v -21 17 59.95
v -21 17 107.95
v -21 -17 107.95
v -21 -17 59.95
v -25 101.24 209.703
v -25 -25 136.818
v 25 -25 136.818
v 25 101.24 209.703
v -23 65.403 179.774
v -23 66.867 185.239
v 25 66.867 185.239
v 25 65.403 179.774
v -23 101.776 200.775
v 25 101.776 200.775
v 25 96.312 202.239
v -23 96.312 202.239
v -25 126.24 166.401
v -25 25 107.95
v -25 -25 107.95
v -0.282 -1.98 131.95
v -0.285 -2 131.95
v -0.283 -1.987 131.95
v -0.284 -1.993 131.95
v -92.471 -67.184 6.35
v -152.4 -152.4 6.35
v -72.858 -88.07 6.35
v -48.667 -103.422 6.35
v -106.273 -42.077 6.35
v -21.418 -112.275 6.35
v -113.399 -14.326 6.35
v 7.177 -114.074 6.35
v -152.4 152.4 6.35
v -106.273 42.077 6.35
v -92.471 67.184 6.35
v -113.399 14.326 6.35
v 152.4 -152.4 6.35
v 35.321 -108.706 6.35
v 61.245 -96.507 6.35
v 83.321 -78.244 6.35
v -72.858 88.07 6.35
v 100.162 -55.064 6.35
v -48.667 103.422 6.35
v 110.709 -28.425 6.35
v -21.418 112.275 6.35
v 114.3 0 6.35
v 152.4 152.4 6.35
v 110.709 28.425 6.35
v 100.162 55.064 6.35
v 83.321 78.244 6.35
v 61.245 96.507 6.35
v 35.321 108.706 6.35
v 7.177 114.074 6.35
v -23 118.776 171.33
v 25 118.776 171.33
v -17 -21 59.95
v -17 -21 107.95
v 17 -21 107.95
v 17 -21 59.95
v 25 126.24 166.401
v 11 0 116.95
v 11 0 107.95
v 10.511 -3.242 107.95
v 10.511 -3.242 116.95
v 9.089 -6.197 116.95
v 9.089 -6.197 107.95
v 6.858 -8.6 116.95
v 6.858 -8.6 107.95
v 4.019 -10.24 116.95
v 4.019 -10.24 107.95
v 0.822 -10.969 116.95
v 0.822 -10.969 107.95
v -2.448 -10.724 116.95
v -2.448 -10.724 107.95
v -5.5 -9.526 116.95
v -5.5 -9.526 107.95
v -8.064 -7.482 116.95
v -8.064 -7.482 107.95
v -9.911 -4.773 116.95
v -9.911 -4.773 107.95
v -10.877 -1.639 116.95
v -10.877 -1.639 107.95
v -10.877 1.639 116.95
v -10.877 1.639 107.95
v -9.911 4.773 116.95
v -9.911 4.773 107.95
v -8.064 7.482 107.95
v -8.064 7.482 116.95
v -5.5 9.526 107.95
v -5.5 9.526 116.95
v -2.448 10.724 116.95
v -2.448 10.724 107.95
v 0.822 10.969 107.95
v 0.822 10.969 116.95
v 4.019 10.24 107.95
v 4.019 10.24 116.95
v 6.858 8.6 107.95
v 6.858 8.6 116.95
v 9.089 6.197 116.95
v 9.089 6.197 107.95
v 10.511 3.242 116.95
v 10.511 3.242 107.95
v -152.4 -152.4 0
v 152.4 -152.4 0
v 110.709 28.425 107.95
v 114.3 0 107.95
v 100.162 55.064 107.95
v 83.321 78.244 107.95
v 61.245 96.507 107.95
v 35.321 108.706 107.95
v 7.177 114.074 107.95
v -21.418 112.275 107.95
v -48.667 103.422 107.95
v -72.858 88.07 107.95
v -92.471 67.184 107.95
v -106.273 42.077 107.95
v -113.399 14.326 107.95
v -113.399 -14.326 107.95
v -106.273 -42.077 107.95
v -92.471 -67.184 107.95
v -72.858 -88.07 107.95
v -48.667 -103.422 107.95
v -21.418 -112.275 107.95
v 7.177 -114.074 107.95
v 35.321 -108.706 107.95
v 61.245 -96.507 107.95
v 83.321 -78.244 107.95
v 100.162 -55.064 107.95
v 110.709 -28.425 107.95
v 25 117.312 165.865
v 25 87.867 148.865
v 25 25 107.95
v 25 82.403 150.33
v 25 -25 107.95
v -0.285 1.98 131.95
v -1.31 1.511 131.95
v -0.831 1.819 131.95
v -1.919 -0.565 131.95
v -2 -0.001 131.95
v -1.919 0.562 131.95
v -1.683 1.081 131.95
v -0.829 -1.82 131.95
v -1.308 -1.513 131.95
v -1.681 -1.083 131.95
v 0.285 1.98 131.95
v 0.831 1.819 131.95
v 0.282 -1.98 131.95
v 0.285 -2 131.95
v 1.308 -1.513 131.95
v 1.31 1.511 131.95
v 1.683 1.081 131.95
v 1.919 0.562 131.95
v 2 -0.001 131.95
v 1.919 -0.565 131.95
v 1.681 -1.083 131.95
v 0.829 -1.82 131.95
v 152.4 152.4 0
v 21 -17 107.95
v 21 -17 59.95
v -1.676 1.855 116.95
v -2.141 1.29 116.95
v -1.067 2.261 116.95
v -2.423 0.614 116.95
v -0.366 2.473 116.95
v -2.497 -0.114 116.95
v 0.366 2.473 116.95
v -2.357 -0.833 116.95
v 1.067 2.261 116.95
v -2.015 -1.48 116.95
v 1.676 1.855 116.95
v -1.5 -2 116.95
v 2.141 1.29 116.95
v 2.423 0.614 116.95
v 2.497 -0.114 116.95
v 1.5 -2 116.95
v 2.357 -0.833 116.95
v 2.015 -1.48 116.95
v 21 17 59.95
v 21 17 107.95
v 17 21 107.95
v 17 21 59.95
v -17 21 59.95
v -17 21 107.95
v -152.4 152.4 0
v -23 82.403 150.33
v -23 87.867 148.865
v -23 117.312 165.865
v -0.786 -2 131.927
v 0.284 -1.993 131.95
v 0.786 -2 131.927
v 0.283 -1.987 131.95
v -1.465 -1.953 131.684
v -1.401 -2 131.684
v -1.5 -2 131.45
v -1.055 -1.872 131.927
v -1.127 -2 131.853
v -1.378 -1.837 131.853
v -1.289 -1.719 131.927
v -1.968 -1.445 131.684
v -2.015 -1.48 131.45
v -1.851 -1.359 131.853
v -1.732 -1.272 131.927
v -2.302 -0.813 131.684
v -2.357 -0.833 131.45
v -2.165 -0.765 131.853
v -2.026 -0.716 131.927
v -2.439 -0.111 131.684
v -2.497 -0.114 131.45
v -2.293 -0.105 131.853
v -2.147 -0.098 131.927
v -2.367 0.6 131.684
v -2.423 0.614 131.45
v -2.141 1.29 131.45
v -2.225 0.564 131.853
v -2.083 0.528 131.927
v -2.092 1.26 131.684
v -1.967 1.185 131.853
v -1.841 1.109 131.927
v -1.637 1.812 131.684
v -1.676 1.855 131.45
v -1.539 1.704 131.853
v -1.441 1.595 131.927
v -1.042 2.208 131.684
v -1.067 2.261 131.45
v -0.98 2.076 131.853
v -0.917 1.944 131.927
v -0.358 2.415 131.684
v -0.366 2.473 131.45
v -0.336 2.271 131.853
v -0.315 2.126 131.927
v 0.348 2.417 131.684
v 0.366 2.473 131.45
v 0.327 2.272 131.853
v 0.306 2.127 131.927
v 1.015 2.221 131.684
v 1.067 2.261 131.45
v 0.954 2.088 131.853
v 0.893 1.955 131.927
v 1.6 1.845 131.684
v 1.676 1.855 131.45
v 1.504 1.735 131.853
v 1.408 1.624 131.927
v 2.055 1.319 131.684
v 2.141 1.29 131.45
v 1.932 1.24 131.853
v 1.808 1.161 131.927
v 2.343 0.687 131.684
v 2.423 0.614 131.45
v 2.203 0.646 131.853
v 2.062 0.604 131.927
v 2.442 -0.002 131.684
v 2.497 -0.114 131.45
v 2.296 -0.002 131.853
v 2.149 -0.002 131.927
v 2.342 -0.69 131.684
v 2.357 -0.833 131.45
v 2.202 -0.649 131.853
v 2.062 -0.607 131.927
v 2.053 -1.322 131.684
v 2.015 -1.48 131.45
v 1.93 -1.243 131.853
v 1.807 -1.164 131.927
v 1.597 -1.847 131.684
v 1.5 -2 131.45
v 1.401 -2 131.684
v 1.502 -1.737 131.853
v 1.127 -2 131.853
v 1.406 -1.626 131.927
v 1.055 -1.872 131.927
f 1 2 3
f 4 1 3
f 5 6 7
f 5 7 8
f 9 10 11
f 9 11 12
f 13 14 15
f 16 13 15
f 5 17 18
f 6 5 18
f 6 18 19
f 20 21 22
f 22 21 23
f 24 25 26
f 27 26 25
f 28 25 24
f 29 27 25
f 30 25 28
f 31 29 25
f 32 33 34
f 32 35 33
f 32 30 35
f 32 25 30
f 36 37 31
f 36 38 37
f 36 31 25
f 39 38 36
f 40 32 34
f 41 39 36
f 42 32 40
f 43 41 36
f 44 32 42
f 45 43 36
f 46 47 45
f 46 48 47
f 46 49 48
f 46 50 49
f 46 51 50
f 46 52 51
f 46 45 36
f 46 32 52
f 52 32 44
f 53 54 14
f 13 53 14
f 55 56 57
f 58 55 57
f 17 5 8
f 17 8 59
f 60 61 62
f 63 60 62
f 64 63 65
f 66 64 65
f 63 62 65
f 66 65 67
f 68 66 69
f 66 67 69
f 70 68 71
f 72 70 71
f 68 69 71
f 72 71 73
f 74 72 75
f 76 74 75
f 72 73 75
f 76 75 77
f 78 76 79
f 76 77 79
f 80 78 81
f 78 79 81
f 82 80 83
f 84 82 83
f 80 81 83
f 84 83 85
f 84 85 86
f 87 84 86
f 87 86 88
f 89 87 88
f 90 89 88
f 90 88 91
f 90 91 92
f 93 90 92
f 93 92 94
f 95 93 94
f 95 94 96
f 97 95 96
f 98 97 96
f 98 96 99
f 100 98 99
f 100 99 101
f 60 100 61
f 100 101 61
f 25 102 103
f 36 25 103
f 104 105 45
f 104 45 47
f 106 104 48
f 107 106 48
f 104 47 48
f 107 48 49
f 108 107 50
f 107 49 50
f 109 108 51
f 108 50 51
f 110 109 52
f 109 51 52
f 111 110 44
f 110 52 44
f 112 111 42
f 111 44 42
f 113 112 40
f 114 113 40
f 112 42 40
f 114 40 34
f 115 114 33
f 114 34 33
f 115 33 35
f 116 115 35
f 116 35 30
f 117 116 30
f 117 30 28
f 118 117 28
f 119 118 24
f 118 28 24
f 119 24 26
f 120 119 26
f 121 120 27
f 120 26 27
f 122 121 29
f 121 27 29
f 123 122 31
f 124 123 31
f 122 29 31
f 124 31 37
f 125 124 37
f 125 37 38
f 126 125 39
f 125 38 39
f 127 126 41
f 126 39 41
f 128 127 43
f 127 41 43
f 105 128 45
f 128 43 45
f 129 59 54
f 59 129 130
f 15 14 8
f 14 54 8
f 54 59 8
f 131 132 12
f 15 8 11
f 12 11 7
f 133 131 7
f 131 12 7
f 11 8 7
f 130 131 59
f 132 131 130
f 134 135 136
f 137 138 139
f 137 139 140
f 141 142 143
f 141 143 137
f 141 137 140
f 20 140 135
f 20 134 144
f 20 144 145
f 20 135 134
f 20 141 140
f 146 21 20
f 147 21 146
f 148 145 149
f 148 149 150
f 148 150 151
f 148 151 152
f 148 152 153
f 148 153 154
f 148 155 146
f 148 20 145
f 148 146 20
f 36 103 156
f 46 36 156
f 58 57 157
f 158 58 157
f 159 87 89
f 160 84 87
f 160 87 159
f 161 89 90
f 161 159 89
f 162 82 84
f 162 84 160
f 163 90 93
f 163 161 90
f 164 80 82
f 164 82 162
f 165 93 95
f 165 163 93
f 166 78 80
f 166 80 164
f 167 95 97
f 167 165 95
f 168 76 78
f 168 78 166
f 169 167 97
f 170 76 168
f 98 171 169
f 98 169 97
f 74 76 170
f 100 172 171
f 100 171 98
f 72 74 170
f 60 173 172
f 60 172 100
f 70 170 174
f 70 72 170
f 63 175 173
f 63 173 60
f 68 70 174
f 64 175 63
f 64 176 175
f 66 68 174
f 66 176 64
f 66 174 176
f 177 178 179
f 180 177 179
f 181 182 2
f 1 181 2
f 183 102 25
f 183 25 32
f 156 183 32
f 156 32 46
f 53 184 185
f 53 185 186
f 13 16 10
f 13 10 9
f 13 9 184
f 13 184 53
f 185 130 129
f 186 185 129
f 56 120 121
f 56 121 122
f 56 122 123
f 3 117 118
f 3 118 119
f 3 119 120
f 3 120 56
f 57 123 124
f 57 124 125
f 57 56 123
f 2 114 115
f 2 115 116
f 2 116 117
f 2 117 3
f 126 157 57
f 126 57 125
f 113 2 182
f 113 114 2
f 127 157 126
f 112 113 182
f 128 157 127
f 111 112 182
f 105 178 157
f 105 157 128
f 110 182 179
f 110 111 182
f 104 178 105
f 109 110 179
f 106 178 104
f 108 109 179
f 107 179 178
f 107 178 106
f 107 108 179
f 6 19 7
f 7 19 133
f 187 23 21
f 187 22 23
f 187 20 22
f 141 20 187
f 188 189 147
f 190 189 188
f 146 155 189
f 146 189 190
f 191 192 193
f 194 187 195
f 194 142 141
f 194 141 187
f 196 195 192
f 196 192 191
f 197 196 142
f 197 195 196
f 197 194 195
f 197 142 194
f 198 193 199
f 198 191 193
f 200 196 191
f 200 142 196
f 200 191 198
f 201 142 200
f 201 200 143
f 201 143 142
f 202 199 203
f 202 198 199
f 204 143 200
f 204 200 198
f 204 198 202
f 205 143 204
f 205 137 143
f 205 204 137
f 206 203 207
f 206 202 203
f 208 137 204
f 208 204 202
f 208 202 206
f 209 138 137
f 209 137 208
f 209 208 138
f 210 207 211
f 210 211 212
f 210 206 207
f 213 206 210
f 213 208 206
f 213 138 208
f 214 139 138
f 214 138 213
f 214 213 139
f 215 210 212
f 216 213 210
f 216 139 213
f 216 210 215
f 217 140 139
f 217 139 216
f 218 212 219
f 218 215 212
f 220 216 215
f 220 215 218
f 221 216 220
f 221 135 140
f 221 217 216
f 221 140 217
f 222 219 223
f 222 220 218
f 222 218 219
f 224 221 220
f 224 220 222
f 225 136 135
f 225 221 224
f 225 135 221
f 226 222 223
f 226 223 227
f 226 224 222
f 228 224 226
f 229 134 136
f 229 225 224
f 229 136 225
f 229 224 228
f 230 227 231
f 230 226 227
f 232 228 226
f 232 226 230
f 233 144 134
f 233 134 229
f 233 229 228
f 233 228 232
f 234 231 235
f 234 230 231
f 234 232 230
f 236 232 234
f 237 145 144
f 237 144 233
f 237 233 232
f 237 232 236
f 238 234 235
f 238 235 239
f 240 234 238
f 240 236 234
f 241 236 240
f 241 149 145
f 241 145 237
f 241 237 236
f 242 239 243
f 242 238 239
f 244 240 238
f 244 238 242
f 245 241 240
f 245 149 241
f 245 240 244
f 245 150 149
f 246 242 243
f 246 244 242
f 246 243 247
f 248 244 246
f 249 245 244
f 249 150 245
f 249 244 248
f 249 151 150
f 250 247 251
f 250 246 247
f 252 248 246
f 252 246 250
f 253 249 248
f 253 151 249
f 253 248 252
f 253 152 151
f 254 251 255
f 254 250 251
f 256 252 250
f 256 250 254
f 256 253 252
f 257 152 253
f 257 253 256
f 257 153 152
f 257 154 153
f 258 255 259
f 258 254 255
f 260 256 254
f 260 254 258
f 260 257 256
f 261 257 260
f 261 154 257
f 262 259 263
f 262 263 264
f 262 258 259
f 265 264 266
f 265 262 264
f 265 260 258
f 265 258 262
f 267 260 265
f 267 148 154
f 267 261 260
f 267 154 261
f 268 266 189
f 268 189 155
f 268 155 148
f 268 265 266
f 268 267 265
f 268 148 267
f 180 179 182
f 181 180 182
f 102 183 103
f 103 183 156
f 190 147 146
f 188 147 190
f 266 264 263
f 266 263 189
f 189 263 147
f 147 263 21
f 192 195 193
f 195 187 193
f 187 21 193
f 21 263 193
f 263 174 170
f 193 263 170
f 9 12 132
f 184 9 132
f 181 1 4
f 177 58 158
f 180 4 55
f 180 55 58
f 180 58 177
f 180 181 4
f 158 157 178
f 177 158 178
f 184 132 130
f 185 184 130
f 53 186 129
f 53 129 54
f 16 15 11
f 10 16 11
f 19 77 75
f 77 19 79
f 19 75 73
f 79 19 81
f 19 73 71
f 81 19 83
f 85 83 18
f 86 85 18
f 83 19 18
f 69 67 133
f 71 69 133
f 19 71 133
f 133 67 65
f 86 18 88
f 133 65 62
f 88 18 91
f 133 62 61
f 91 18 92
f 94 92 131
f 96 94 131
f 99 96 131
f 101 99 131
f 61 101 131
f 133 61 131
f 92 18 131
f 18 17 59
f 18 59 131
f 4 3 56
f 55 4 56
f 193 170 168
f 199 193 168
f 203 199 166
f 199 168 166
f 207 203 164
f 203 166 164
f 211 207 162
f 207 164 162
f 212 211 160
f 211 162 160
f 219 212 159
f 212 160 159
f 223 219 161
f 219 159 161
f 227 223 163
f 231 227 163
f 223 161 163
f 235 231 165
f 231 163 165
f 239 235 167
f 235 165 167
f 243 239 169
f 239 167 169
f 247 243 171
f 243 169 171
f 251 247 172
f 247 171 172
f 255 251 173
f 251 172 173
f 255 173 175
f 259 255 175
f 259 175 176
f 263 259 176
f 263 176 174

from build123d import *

# Parameters (mm, degrees)
F0_W         = 304.8
F0_H         = 304.8
F1_DEPTH     = 6.35
F2_R         = 114.3
F3_DEPTH     = 101.6
F4_W         = 50
F4_H         = 50
F5_DEPTH     = 28.868
F7_DEPTH     = 50
F9_DEPTH     = 48
F11_DEPTH    = 48
F12_R        = 11
F13_DEPTH    = 9
F15_DEPTH    = 15
F16_T2_ANGLE = 343.7894292622


# Not quite as in the source:
# - a fillet or chamfer that OpenCascade refuses, or shapes differently, is made with other operations: its cross-section is extruded or revolved along the edge and cut away or added


with BuildPart() as f1:
    # F0 (on Top) → F1 (new body)
    with BuildSketch(Plane.XY):
        Rectangle(F0_W, F0_H)
    extrude(amount=F1_DEPTH)

    # F2 (on face) → F3 (join)
    with BuildSketch(Plane.XY.offset(6.35)):
        Circle(F2_R)
    extrude(amount=F3_DEPTH)

    # F10 (on face) → F11 (cut)
    with BuildSketch(Plane.XY.offset(107.95)):
        Polygon((-21.0001030612, 17), (-21.0001030612, -17), (-17, -21.0001030612), (17, -21.0001030612), (21.0001030612, -17), (21.0001030612, 17), (17, 21.0001030612), (-17, 21.0001030612), align=None)
    extrude(amount=-F11_DEPTH, mode=Mode.SUBTRACT)


with BuildPart() as f5:
    # F4 (on face) → F5 (new body)
    with BuildSketch(Plane.XY.offset(107.95)):
        Rectangle(F4_W, F4_H)
    extrude(amount=F5_DEPTH)

    # F6 (on face) → F7 (join)
    with BuildSketch(Plane(origin=(-25, 0, 0), x_dir=(0, -1, 0), z_dir=(-1, 0, 0))):
        Polygon((-25, 136.818), (25, 136.818), (-101.2399952248, 209.7026952255), (-126.2399952248, 166.4014250363), (-25, 107.9504865405), align=None)
    extrude(amount=-F7_DEPTH)

    # F8 (on face) → F9 (cut)
    with BuildSketch(Plane.YZ.offset(25)):
        Polygon((96.3117404639, 202.238682864), (66.8668767352, 185.238682864), (65.4027373971, 179.7744404647), (82.4027373971, 150.329576736), (87.8669797964, 148.8654373978), (117.3118435251, 165.8654373978), (118.7759828632, 171.3296797972), (101.7759828632, 200.7745435258), align=None)
    extrude(amount=-F9_DEPTH, mode=Mode.SUBTRACT)

    # F12 (on face) → F13 (cut)
    with BuildSketch(Plane(origin=(0, 0, 107.95), x_dir=(1, 0, 0), z_dir=(0, 0, -1))):
        Circle(F12_R)
    extrude(amount=-F13_DEPTH, mode=Mode.SUBTRACT)

    # F14 (on face) → F15 (cut)
    with BuildSketch(Plane(origin=(0, 0, 116.95), x_dir=(1, 0, 0), z_dir=(0, 0, -1))):
        with BuildLine():
            Line((1.5, 2), (-1.5, 2))
            ThreePointArc((-1.5, 2), (0, -2.5), (1.5, 2))
        make_face()
    extrude(amount=-F15_DEPTH, mode=Mode.SUBTRACT)

    # F16: fillet of radius 0.5 on 1 edges, made by hand

    # F16_s1 → F16_t2 (revolve)
    with BuildSketch(Plane(origin=(0, 0, 0), x_dir=(0, 0, 1), z_dir=(0.9900106558, -0.1409925581, 0))):
        with BuildLine():
            ThreePointArc((131.45, 2.5), (131.8035533906, 2.3535533906), (131.95, 2))
            Line((131.95, 2), (131.95, 2.5))
            Line((131.95, 2.5), (131.45, 2.5))
        make_face()
    revolve(axis=Axis((0, 0, 131.95), (0, 0, -1)), revolution_arc=F16_T2_ANGLE)


solid = Compound([f1.part, f5.part])
